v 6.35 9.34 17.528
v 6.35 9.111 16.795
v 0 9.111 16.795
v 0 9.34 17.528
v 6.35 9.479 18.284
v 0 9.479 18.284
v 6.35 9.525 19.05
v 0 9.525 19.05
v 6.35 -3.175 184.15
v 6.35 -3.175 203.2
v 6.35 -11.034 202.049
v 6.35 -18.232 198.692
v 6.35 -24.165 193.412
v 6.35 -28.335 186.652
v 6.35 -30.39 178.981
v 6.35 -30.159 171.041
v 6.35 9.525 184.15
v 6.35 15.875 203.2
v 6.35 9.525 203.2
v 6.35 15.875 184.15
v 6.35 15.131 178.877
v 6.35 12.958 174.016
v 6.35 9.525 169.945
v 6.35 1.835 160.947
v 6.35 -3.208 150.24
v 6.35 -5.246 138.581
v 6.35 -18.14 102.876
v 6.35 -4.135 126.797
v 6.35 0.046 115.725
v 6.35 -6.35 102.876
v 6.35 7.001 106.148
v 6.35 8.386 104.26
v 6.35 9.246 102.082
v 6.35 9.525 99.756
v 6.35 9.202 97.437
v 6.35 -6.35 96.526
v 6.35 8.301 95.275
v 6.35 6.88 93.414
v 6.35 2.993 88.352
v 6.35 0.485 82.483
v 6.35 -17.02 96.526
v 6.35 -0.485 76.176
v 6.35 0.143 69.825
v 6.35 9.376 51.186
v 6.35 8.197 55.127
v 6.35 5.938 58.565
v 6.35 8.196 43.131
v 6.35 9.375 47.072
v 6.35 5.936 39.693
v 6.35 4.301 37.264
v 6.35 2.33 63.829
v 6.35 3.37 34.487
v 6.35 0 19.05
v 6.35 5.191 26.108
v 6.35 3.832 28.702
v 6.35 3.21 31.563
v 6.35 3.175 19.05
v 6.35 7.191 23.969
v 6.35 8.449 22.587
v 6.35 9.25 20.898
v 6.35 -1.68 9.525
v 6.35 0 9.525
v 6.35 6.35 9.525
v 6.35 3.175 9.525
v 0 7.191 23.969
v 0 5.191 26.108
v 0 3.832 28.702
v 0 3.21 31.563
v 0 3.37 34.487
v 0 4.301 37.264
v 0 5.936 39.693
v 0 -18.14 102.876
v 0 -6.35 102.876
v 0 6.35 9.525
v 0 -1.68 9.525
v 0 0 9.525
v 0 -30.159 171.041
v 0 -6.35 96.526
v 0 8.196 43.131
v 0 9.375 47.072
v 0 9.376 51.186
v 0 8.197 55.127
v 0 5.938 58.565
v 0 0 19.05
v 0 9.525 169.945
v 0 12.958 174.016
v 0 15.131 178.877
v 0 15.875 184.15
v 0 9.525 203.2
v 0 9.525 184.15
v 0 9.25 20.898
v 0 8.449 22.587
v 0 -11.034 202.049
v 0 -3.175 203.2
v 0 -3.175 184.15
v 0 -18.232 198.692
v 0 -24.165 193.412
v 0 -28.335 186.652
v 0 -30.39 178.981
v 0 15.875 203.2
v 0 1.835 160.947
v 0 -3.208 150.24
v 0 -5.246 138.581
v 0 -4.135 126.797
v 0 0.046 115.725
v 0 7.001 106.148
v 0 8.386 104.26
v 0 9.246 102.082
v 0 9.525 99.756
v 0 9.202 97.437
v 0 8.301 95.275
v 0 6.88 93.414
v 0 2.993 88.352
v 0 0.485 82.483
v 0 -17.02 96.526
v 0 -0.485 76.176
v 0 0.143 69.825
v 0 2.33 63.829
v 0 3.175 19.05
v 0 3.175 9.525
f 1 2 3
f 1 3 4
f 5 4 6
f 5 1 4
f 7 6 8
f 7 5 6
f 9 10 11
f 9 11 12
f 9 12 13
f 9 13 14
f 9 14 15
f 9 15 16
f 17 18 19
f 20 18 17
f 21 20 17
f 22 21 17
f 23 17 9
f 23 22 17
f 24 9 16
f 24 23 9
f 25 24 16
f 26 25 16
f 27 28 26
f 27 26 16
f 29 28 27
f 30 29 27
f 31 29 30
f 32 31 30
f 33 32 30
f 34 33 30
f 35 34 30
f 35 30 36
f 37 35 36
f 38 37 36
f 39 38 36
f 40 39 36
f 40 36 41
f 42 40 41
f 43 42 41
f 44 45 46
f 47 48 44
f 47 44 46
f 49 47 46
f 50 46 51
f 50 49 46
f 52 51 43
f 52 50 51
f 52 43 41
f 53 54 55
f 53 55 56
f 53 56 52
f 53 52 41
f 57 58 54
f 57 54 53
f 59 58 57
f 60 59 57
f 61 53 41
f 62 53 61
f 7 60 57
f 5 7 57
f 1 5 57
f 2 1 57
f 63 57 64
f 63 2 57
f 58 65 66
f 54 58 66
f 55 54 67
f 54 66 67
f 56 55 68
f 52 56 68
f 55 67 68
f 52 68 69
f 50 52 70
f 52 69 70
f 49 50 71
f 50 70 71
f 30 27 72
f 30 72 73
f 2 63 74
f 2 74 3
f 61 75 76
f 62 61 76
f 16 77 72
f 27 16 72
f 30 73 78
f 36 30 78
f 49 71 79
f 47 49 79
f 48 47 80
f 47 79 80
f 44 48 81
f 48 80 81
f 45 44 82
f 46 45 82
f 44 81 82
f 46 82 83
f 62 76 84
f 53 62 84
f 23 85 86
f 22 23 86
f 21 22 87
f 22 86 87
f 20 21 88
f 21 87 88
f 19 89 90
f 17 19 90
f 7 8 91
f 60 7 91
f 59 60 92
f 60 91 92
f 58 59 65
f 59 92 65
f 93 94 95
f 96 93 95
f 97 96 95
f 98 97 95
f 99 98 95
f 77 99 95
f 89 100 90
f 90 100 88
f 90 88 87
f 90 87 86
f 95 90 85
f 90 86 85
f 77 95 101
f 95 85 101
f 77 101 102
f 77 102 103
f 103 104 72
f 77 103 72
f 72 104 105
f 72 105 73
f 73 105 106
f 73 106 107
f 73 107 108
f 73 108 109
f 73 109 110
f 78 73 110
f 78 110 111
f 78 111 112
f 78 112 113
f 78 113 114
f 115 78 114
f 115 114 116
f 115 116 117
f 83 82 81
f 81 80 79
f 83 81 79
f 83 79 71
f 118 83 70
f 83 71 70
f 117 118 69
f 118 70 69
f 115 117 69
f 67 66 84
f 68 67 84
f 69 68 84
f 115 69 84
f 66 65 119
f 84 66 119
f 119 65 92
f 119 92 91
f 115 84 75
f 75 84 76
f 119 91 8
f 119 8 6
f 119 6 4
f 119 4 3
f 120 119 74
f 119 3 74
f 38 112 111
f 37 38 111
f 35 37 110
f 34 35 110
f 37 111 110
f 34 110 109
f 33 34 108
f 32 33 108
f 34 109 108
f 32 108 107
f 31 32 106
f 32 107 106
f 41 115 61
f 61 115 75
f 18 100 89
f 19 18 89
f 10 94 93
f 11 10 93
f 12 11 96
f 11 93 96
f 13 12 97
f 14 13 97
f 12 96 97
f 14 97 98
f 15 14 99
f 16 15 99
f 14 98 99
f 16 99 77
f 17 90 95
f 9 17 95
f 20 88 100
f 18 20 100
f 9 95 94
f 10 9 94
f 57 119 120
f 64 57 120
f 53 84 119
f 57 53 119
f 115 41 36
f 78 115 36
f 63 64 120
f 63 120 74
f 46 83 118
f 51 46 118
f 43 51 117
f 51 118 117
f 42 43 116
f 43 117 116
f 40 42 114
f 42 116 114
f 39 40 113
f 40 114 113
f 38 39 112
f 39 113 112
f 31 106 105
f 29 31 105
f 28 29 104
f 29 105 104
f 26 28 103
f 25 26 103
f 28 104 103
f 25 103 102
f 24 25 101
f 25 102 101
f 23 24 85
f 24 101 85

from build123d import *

# Parameters (mm, degrees)
BOSS_EXTRUDE1_DEPTH = 6.35
SKETCH2_W           = 6.35
SKETCH2_H           = 11.789754461
CUT_EXTRUDE1_DEPTH  = 206.585562738
CUT_EXTRUDE2_DEPTH  = 206.585562738


with BuildPart() as part:
    # Sketch1 → Boss-Extrude1 (new body)
    with BuildSketch(Plane(origin=(0, 0, 0), x_dir=(0, 0, -1), z_dir=(1, 0, 0))):
        with BuildLine():
            Line((-19.05, 0), (-19.05, 3.175))
            Line((-19.05, 3.175), (0, 3.175))
            Line((0, 3.175), (0, 9.525))
            Line((0, 9.525), (-19.05, 9.525))
            ThreePointArc((-19.05, 9.525), (-21.772170288, 8.911923298), (-23.968703037, 7.191075252))
            ThreePointArc((-23.968703037, 7.191075252), (-31.563196652, 3.209635371), (-39.693056937, 5.936092509))
            ThreePointArc((-39.693056937, 5.936092509), (-49.128661086, 9.524999891), (-58.565155627, 5.938434313))
            ThreePointArc((-58.565155627, 5.938434313), (-76.175633399, -0.485223061), (-93.413507935, 6.880099943))
            ThreePointArc((-93.413507935, 6.880099943), (-99.75616874, 9.524590732), (-106.147751964, 7.000637182))
            ThreePointArc((-106.147751964, 7.000637182), (-138.580790239, -5.246129508), (-169.944766377, 9.525))
            ThreePointArc((-169.944766377, 9.525), (-176.370039167, 14.215248831), (-184.15, 15.875))
            Line((-184.15, 15.875), (-203.2, 15.875))
            Line((-203.2, 15.875), (-203.2, 9.525))
            Line((-203.2, 9.525), (-184.15, 9.525))
            Line((-184.15, 9.525), (-184.15, -3.175))
            Line((-184.15, -3.175), (-203.2, -3.175))
            ThreePointArc((-203.2, -3.175), (-193.412202449, -24.164999585), (-171.041454914, -30.159223321))
            Line((-171.041454914, -30.159223321), (-9.525, -1.679514491))
            Line((-9.525, -1.679514491), (-9.525, 0))
            Line((-9.525, 0), (-19.05, 0))
        make_face()
    extrude(amount=BOSS_EXTRUDE1_DEPTH)

    # Sketch2 → Cut-Extrude1 (cut, through all)
    with BuildSketch(Plane(origin=(6.35, 0, 0), x_dir=(0, 0, -1), z_dir=(1, 0, 0))):
        with Locations((-99.700659688, -12.244877231)):
            Rectangle(SKETCH2_W, SKETCH2_H)
    extrude(amount=-CUT_EXTRUDE1_DEPTH, mode=Mode.SUBTRACT)

    # Sketch3 → Cut-Extrude2 (cut, through all)
    with BuildSketch(Plane(origin=(6.35, 0, 0), x_dir=(0, 0, -1), z_dir=(1, 0, 0))):
        with BuildLine():
            Line((-9.525, 3.175), (-9.525, 6.35))
            Line((-9.525, 6.35), (-16.795425987, 9.11127796))
            ThreePointArc((-16.795425987, 9.11127796), (-17.903890286, 9.420713132), (-19.05, 9.525))
            Line((-19.05, 9.525), (0, 9.525))
            Line((0, 9.525), (0, 3.175))
            Line((0, 3.175), (-9.525, 3.175))
        make_face()
    extrude(amount=-CUT_EXTRUDE2_DEPTH, mode=Mode.SUBTRACT)


solid = part.part
